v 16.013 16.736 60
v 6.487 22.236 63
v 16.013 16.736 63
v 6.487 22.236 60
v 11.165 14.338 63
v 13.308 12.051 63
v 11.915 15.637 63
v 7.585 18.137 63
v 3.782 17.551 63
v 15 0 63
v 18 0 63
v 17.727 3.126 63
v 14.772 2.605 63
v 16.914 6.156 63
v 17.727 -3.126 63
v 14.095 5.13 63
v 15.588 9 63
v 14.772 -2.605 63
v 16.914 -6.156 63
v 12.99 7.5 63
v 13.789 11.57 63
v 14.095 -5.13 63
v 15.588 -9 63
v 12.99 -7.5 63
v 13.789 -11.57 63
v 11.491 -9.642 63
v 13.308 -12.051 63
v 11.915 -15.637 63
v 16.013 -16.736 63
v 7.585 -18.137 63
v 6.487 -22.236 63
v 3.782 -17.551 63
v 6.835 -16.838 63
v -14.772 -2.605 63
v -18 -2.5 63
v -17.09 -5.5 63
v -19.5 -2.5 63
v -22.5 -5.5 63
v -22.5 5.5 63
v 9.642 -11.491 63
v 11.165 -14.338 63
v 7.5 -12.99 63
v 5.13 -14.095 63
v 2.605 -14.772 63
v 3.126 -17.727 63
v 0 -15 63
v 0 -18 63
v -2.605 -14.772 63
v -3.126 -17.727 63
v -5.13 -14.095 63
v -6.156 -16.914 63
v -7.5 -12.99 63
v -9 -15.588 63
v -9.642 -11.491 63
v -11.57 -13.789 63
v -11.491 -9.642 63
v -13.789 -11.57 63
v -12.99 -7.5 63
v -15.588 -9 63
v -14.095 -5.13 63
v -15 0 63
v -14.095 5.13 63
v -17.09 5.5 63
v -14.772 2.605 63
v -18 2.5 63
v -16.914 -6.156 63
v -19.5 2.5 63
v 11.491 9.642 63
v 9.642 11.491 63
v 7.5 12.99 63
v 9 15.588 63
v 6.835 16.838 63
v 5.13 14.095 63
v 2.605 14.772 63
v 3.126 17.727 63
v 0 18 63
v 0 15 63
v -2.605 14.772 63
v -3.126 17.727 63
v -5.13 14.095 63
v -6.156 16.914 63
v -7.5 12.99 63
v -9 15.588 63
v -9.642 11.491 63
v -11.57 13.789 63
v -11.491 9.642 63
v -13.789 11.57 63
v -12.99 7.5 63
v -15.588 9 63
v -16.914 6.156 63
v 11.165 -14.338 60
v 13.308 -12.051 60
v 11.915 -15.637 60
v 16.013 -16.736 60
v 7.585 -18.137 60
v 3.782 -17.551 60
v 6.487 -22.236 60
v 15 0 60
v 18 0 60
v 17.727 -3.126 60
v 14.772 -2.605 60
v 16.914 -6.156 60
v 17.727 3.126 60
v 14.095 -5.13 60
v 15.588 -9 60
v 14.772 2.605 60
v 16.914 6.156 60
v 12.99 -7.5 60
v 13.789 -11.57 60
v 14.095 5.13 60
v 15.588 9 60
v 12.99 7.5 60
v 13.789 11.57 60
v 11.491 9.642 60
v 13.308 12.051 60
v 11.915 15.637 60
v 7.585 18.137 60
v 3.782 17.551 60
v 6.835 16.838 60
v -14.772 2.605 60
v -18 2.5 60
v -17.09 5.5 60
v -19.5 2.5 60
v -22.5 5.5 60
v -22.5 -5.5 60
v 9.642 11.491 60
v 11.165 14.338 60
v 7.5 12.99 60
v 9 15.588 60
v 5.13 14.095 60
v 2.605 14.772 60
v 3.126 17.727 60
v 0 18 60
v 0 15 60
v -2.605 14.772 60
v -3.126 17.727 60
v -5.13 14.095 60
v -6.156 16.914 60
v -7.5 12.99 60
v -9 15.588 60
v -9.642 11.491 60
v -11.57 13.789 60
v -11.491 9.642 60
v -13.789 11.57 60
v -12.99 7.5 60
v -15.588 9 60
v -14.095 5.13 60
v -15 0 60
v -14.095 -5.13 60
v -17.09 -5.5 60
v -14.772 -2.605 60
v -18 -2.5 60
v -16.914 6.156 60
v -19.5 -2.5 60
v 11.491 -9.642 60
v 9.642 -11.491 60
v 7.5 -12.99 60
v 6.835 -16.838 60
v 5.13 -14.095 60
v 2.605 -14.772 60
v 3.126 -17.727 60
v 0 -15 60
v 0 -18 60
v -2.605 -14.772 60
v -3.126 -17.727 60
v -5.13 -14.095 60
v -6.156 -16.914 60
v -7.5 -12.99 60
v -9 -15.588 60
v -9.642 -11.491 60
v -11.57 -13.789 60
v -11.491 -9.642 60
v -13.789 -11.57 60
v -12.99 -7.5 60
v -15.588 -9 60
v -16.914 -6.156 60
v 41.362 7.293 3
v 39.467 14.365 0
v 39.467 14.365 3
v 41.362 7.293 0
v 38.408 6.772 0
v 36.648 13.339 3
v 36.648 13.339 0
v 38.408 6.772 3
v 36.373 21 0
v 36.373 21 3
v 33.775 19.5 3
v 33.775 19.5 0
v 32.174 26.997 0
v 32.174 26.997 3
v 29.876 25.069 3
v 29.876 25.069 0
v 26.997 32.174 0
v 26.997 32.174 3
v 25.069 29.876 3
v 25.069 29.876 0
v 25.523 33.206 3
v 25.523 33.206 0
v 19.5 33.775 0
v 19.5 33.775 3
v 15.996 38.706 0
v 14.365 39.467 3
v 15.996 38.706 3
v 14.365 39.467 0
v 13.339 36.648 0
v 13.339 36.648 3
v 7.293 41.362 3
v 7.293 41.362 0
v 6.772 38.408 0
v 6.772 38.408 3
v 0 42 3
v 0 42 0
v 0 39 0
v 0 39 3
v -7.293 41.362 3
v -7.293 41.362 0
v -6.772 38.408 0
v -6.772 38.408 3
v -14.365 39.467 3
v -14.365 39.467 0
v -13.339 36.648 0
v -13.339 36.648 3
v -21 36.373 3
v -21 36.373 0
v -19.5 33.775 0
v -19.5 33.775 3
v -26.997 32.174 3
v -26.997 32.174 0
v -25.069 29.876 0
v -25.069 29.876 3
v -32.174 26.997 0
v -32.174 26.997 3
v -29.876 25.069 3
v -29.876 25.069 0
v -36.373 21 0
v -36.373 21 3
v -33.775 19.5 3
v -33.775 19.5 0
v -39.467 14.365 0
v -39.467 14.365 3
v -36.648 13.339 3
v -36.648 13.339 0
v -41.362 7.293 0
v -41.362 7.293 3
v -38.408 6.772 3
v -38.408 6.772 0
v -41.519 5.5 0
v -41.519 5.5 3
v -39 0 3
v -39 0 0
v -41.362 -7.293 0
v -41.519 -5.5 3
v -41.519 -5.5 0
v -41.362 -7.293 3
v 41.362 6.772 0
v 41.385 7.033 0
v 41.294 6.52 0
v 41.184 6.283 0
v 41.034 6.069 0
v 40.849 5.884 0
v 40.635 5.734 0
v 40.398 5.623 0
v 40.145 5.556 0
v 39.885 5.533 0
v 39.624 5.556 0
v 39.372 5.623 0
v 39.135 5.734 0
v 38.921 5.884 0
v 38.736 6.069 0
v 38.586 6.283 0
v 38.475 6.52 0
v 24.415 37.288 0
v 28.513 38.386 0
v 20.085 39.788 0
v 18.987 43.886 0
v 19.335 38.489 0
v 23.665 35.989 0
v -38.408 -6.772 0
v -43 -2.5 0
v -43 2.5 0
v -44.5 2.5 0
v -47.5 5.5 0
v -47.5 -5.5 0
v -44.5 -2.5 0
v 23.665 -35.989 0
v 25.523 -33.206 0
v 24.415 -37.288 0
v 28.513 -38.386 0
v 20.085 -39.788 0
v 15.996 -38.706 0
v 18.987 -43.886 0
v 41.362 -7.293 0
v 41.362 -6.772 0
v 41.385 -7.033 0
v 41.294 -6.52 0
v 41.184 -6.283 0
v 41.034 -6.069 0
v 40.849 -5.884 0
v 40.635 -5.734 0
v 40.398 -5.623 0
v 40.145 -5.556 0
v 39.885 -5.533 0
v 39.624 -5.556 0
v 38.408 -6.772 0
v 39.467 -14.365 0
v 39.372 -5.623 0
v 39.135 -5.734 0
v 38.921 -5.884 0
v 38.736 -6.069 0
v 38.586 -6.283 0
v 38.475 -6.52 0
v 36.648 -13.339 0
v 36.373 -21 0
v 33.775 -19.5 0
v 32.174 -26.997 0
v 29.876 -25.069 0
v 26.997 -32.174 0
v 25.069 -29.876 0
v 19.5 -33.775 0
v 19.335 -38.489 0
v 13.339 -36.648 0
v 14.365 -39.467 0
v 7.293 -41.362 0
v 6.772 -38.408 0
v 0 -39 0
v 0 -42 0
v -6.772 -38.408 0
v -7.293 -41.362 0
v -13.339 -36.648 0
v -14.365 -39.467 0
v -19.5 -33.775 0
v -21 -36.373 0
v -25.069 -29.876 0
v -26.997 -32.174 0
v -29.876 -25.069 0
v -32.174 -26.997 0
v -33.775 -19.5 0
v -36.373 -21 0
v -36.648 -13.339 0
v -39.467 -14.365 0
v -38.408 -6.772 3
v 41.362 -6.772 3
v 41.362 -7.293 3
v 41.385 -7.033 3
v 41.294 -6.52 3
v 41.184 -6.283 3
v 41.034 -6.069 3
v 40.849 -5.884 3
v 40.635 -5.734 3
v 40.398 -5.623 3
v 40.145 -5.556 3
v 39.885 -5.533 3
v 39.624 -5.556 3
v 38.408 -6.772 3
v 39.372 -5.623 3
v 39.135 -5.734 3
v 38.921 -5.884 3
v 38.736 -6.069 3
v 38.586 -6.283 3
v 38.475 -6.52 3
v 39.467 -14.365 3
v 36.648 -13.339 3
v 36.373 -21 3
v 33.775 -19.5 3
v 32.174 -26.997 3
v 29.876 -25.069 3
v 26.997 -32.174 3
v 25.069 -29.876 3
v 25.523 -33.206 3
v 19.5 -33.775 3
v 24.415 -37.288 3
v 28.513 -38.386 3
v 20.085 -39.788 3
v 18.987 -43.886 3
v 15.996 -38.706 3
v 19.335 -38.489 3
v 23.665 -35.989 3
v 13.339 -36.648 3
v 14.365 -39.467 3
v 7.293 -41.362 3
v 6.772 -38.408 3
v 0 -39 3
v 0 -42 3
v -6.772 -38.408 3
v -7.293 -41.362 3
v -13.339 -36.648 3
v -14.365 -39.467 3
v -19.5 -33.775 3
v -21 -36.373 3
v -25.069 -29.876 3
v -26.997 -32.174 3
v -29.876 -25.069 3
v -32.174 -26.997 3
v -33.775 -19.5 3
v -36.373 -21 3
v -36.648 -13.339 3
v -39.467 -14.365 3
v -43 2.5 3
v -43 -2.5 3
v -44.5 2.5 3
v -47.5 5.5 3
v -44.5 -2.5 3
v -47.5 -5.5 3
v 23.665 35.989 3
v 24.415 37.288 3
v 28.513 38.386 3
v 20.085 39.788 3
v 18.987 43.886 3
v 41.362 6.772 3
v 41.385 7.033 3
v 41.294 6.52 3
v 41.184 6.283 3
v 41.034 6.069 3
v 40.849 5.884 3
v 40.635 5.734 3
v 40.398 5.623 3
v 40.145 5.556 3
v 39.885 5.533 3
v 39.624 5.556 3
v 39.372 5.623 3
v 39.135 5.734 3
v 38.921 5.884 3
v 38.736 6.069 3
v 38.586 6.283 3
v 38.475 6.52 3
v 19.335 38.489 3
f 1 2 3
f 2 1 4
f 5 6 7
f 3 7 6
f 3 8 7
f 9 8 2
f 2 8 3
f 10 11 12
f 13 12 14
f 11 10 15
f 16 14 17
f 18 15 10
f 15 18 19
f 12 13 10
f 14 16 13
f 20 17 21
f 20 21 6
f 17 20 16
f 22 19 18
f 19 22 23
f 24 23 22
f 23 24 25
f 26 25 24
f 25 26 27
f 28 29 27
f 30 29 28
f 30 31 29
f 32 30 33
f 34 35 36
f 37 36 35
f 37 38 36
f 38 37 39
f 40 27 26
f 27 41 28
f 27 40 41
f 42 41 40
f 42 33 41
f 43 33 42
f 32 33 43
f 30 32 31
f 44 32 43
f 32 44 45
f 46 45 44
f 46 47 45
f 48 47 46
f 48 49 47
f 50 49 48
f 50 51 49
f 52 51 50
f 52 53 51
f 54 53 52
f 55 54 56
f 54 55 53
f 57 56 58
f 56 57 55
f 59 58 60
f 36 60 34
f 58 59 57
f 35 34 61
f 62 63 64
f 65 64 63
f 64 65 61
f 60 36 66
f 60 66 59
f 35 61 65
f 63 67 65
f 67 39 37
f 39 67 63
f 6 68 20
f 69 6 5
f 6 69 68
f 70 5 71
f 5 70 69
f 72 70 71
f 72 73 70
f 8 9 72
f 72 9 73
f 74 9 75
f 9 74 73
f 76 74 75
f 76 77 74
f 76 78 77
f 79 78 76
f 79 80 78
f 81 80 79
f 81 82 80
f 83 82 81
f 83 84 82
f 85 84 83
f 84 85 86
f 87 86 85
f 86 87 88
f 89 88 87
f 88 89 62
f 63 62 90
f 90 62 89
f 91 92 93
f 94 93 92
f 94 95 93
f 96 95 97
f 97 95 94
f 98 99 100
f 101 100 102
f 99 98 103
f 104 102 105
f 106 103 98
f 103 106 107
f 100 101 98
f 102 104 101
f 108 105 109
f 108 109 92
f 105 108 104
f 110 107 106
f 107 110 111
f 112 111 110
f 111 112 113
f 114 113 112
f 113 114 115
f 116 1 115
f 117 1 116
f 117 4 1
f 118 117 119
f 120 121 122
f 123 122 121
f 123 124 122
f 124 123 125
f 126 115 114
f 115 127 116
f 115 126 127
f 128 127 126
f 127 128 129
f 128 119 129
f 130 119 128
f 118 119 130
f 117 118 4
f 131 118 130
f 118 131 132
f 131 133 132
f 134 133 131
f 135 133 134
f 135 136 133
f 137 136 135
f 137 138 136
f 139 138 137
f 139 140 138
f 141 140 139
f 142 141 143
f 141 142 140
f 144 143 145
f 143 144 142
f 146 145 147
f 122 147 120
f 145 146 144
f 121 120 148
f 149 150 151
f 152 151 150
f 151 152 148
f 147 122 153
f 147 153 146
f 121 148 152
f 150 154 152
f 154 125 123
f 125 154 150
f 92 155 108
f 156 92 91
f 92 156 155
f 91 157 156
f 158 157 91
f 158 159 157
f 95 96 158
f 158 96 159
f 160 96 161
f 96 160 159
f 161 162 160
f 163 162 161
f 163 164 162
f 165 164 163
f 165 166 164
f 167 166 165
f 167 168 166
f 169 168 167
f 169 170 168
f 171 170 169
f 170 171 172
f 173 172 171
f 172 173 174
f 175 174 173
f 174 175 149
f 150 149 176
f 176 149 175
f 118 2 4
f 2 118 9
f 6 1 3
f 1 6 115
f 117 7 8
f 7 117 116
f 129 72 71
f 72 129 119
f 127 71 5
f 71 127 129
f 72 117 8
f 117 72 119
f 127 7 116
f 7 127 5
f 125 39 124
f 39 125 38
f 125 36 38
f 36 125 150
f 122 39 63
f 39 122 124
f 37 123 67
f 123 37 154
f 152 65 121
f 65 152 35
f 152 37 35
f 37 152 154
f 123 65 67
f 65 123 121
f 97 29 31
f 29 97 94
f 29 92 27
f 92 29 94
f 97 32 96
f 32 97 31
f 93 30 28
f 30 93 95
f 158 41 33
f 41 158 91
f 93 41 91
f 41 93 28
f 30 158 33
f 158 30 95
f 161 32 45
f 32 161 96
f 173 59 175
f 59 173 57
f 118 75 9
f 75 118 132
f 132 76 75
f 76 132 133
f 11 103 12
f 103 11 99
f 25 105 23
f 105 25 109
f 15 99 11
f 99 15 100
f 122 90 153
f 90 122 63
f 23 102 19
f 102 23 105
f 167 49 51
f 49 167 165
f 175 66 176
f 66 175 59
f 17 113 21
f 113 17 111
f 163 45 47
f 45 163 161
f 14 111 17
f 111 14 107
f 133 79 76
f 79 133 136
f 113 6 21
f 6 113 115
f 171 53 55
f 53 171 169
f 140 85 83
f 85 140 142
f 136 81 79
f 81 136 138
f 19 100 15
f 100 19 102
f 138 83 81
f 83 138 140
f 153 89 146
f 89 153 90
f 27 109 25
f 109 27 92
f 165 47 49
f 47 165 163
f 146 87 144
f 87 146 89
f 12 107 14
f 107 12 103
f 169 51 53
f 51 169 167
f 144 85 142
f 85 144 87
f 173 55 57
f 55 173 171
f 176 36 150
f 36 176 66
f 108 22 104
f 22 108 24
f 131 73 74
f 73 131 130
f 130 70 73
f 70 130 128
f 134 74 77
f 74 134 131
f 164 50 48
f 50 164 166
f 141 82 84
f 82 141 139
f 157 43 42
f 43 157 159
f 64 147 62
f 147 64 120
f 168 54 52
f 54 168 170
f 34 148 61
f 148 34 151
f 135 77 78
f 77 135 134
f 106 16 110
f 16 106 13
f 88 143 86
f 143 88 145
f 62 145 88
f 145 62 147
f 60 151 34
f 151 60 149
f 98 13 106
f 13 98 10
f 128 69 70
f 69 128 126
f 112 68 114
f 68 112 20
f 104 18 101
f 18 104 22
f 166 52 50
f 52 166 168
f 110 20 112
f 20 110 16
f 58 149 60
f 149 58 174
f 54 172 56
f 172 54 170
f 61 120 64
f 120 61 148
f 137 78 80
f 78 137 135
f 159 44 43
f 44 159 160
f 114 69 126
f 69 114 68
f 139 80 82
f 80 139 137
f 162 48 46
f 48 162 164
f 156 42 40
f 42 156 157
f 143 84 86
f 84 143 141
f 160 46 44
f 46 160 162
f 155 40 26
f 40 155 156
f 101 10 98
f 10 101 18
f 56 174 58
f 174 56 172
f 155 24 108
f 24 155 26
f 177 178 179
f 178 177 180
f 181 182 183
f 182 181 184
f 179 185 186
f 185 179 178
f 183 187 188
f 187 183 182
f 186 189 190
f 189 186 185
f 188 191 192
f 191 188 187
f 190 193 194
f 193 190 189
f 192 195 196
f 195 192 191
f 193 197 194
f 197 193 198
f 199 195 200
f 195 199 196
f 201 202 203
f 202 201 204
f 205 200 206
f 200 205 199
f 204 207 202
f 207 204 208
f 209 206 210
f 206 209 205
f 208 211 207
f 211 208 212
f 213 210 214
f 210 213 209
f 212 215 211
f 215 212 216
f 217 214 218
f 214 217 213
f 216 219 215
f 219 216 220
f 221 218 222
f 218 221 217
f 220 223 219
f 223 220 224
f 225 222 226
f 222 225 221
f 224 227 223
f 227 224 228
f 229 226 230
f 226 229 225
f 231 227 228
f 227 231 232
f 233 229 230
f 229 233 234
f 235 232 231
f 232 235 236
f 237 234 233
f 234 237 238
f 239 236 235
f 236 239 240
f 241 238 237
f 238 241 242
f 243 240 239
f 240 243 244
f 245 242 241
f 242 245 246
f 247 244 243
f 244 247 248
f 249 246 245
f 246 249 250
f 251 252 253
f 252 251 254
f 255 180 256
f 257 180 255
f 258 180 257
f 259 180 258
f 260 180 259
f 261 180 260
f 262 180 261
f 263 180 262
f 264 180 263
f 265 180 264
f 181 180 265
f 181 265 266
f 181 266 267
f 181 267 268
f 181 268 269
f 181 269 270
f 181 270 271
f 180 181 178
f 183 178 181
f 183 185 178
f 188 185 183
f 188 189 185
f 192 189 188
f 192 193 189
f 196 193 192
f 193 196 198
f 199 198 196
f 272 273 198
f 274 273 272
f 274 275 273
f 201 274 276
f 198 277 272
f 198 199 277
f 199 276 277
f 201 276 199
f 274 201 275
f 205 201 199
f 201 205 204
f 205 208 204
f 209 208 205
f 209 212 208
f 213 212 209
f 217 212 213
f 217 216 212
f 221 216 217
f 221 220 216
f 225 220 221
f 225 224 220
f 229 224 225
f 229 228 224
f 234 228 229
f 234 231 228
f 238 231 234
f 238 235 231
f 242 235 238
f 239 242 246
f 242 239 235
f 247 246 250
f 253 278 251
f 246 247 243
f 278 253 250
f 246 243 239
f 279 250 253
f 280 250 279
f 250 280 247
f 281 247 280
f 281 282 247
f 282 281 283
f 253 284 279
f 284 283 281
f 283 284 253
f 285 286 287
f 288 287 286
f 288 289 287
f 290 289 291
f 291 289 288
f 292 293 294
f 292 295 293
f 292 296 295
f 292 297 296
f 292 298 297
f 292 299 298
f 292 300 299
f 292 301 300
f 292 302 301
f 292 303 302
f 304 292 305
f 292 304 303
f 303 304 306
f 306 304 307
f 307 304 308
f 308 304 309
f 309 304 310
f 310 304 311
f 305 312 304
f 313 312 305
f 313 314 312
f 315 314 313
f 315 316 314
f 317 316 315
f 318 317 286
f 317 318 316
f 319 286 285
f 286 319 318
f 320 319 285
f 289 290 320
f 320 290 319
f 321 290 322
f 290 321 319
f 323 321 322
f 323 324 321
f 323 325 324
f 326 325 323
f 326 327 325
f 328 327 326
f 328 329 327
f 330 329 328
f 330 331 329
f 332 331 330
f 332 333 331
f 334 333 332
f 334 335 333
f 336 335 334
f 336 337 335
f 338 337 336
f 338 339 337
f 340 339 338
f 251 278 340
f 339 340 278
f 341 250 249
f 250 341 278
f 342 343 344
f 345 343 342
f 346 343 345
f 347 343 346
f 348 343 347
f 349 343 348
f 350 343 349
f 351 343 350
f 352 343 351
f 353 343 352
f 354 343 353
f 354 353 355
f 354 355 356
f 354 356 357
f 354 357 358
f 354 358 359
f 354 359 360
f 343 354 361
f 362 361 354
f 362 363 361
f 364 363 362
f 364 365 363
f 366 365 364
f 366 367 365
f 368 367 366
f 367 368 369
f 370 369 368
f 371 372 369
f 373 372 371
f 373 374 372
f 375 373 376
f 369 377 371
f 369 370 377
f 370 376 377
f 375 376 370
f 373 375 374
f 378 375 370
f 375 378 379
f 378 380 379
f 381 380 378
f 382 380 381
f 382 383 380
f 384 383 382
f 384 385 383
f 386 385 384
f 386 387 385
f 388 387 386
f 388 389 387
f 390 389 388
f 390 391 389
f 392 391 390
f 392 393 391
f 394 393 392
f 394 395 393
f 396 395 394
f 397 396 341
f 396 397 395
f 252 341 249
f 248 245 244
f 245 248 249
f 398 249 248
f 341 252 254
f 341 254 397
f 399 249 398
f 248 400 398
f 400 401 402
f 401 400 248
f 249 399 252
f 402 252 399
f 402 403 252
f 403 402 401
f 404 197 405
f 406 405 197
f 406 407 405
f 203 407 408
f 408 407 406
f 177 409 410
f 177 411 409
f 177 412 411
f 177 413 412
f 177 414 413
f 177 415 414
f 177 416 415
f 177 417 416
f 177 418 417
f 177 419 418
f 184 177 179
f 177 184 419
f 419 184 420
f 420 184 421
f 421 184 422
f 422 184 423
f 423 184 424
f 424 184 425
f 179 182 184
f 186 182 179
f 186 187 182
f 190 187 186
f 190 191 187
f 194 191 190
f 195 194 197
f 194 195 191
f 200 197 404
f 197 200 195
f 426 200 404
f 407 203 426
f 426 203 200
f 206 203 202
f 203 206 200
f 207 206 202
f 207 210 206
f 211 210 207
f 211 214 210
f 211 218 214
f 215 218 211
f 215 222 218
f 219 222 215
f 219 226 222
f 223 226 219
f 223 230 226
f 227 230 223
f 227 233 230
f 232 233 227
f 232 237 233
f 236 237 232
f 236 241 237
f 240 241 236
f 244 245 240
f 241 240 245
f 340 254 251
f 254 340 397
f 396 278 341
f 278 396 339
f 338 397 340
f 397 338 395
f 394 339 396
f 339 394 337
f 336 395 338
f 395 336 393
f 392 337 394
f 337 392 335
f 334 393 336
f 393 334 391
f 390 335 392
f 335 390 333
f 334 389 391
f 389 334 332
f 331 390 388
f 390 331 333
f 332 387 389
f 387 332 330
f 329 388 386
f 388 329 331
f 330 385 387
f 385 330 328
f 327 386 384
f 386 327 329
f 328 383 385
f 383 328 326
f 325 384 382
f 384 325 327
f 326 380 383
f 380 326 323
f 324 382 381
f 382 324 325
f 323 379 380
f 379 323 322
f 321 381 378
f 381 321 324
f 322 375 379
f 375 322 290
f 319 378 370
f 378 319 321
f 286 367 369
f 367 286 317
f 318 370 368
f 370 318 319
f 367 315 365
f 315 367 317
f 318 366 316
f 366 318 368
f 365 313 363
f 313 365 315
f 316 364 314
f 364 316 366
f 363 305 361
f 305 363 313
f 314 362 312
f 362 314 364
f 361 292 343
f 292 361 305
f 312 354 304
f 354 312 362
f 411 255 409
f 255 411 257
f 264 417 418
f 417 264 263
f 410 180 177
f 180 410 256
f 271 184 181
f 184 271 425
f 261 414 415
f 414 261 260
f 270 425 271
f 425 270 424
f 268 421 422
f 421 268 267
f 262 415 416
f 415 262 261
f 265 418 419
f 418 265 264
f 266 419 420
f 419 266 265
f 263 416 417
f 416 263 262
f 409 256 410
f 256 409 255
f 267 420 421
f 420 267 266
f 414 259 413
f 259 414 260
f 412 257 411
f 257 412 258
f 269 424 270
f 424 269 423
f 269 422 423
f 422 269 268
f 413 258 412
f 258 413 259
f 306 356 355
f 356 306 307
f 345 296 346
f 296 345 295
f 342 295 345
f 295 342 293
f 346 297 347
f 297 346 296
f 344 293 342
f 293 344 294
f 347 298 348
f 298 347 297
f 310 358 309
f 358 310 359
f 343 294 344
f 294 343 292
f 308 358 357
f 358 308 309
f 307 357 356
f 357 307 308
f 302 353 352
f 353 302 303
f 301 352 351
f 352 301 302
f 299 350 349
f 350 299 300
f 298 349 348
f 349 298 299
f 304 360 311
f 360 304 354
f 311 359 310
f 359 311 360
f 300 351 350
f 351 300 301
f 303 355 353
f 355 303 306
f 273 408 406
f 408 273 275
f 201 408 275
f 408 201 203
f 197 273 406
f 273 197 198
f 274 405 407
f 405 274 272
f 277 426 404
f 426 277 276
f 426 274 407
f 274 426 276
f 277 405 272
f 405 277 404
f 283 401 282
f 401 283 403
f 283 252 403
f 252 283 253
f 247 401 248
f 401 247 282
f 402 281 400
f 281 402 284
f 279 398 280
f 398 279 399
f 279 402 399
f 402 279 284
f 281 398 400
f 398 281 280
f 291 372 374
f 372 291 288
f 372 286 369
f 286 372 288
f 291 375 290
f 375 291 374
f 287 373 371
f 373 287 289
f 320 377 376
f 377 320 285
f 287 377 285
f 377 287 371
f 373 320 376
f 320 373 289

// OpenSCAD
// CC BY-SA 4.0, @tamberg

$fn = 36;

d = 3;

wx_ziptie = 1.5;
wy_ziptie = 5;

wx_eyelet = wx_ziptie + 2 * d;
wy_eyelet = wy_ziptie + 2 * d;

module ziptie(h) {
  cube([wx_ziptie, wy_ziptie, h + 0.02]);
}

module eyelet(h) {
  difference() {
    cube([wx_eyelet, wy_eyelet, h]);
    translate([(wx_eyelet - wx_ziptie) / 2, (wy_eyelet - wy_ziptie) / 2, -0.01]) ziptie(h);
  }
}

module crown(ro, ri, h) {
  difference() {
    union() {
      cylinder(h, ro, ro);
      translate([ri, -wy_eyelet / 2, 0]) eyelet(d);
      rotate([0, 0, 120]) translate([ri, -wy_eyelet / 2, 0]) eyelet(d);
      rotate([0, 0, 2 * 120]) translate([ri, -wy_eyelet / 2, 0]) eyelet(d);
    }
    translate([0, 0, -0.01]) cylinder(h + 0.02, ri, ri);
  }
}

module clamp(h, w, r, a) {
  rotate([0, 0, (360 - a)/2]) {
    rotate_extrude(angle=a)
    translate([r, 0, 0])
    square([w, h]);
    translate([cos(0) * (r + w/2), sin(0) * (r + w/2), 0]) cylinder(h, w/2, w/2);
    translate([cos(a) * (r + w/2), sin(a) * (r + w/2), 0]) cylinder(h, w/2, w/2);
  }
}

module collar(h, w, r) {
  union() {
    translate([0, 0, 0]) clamp(h, w, r, 340);
    rotate([0, 0, 60]) translate([r + 1, -wy_eyelet / 2, 0]) eyelet(3);
    rotate([0, 0, 180]) translate([r + 1, -wy_eyelet / 2, 0]) eyelet(3);
    rotate([0, 0, 300]) translate([r + 1, -wy_eyelet / 2, 0]) eyelet(3);
  }
}

translate([0, 0, 60]) rotate([0, 0, 60]) crown(15 + d, 15, d);
collar(3, 3, 78/2);
